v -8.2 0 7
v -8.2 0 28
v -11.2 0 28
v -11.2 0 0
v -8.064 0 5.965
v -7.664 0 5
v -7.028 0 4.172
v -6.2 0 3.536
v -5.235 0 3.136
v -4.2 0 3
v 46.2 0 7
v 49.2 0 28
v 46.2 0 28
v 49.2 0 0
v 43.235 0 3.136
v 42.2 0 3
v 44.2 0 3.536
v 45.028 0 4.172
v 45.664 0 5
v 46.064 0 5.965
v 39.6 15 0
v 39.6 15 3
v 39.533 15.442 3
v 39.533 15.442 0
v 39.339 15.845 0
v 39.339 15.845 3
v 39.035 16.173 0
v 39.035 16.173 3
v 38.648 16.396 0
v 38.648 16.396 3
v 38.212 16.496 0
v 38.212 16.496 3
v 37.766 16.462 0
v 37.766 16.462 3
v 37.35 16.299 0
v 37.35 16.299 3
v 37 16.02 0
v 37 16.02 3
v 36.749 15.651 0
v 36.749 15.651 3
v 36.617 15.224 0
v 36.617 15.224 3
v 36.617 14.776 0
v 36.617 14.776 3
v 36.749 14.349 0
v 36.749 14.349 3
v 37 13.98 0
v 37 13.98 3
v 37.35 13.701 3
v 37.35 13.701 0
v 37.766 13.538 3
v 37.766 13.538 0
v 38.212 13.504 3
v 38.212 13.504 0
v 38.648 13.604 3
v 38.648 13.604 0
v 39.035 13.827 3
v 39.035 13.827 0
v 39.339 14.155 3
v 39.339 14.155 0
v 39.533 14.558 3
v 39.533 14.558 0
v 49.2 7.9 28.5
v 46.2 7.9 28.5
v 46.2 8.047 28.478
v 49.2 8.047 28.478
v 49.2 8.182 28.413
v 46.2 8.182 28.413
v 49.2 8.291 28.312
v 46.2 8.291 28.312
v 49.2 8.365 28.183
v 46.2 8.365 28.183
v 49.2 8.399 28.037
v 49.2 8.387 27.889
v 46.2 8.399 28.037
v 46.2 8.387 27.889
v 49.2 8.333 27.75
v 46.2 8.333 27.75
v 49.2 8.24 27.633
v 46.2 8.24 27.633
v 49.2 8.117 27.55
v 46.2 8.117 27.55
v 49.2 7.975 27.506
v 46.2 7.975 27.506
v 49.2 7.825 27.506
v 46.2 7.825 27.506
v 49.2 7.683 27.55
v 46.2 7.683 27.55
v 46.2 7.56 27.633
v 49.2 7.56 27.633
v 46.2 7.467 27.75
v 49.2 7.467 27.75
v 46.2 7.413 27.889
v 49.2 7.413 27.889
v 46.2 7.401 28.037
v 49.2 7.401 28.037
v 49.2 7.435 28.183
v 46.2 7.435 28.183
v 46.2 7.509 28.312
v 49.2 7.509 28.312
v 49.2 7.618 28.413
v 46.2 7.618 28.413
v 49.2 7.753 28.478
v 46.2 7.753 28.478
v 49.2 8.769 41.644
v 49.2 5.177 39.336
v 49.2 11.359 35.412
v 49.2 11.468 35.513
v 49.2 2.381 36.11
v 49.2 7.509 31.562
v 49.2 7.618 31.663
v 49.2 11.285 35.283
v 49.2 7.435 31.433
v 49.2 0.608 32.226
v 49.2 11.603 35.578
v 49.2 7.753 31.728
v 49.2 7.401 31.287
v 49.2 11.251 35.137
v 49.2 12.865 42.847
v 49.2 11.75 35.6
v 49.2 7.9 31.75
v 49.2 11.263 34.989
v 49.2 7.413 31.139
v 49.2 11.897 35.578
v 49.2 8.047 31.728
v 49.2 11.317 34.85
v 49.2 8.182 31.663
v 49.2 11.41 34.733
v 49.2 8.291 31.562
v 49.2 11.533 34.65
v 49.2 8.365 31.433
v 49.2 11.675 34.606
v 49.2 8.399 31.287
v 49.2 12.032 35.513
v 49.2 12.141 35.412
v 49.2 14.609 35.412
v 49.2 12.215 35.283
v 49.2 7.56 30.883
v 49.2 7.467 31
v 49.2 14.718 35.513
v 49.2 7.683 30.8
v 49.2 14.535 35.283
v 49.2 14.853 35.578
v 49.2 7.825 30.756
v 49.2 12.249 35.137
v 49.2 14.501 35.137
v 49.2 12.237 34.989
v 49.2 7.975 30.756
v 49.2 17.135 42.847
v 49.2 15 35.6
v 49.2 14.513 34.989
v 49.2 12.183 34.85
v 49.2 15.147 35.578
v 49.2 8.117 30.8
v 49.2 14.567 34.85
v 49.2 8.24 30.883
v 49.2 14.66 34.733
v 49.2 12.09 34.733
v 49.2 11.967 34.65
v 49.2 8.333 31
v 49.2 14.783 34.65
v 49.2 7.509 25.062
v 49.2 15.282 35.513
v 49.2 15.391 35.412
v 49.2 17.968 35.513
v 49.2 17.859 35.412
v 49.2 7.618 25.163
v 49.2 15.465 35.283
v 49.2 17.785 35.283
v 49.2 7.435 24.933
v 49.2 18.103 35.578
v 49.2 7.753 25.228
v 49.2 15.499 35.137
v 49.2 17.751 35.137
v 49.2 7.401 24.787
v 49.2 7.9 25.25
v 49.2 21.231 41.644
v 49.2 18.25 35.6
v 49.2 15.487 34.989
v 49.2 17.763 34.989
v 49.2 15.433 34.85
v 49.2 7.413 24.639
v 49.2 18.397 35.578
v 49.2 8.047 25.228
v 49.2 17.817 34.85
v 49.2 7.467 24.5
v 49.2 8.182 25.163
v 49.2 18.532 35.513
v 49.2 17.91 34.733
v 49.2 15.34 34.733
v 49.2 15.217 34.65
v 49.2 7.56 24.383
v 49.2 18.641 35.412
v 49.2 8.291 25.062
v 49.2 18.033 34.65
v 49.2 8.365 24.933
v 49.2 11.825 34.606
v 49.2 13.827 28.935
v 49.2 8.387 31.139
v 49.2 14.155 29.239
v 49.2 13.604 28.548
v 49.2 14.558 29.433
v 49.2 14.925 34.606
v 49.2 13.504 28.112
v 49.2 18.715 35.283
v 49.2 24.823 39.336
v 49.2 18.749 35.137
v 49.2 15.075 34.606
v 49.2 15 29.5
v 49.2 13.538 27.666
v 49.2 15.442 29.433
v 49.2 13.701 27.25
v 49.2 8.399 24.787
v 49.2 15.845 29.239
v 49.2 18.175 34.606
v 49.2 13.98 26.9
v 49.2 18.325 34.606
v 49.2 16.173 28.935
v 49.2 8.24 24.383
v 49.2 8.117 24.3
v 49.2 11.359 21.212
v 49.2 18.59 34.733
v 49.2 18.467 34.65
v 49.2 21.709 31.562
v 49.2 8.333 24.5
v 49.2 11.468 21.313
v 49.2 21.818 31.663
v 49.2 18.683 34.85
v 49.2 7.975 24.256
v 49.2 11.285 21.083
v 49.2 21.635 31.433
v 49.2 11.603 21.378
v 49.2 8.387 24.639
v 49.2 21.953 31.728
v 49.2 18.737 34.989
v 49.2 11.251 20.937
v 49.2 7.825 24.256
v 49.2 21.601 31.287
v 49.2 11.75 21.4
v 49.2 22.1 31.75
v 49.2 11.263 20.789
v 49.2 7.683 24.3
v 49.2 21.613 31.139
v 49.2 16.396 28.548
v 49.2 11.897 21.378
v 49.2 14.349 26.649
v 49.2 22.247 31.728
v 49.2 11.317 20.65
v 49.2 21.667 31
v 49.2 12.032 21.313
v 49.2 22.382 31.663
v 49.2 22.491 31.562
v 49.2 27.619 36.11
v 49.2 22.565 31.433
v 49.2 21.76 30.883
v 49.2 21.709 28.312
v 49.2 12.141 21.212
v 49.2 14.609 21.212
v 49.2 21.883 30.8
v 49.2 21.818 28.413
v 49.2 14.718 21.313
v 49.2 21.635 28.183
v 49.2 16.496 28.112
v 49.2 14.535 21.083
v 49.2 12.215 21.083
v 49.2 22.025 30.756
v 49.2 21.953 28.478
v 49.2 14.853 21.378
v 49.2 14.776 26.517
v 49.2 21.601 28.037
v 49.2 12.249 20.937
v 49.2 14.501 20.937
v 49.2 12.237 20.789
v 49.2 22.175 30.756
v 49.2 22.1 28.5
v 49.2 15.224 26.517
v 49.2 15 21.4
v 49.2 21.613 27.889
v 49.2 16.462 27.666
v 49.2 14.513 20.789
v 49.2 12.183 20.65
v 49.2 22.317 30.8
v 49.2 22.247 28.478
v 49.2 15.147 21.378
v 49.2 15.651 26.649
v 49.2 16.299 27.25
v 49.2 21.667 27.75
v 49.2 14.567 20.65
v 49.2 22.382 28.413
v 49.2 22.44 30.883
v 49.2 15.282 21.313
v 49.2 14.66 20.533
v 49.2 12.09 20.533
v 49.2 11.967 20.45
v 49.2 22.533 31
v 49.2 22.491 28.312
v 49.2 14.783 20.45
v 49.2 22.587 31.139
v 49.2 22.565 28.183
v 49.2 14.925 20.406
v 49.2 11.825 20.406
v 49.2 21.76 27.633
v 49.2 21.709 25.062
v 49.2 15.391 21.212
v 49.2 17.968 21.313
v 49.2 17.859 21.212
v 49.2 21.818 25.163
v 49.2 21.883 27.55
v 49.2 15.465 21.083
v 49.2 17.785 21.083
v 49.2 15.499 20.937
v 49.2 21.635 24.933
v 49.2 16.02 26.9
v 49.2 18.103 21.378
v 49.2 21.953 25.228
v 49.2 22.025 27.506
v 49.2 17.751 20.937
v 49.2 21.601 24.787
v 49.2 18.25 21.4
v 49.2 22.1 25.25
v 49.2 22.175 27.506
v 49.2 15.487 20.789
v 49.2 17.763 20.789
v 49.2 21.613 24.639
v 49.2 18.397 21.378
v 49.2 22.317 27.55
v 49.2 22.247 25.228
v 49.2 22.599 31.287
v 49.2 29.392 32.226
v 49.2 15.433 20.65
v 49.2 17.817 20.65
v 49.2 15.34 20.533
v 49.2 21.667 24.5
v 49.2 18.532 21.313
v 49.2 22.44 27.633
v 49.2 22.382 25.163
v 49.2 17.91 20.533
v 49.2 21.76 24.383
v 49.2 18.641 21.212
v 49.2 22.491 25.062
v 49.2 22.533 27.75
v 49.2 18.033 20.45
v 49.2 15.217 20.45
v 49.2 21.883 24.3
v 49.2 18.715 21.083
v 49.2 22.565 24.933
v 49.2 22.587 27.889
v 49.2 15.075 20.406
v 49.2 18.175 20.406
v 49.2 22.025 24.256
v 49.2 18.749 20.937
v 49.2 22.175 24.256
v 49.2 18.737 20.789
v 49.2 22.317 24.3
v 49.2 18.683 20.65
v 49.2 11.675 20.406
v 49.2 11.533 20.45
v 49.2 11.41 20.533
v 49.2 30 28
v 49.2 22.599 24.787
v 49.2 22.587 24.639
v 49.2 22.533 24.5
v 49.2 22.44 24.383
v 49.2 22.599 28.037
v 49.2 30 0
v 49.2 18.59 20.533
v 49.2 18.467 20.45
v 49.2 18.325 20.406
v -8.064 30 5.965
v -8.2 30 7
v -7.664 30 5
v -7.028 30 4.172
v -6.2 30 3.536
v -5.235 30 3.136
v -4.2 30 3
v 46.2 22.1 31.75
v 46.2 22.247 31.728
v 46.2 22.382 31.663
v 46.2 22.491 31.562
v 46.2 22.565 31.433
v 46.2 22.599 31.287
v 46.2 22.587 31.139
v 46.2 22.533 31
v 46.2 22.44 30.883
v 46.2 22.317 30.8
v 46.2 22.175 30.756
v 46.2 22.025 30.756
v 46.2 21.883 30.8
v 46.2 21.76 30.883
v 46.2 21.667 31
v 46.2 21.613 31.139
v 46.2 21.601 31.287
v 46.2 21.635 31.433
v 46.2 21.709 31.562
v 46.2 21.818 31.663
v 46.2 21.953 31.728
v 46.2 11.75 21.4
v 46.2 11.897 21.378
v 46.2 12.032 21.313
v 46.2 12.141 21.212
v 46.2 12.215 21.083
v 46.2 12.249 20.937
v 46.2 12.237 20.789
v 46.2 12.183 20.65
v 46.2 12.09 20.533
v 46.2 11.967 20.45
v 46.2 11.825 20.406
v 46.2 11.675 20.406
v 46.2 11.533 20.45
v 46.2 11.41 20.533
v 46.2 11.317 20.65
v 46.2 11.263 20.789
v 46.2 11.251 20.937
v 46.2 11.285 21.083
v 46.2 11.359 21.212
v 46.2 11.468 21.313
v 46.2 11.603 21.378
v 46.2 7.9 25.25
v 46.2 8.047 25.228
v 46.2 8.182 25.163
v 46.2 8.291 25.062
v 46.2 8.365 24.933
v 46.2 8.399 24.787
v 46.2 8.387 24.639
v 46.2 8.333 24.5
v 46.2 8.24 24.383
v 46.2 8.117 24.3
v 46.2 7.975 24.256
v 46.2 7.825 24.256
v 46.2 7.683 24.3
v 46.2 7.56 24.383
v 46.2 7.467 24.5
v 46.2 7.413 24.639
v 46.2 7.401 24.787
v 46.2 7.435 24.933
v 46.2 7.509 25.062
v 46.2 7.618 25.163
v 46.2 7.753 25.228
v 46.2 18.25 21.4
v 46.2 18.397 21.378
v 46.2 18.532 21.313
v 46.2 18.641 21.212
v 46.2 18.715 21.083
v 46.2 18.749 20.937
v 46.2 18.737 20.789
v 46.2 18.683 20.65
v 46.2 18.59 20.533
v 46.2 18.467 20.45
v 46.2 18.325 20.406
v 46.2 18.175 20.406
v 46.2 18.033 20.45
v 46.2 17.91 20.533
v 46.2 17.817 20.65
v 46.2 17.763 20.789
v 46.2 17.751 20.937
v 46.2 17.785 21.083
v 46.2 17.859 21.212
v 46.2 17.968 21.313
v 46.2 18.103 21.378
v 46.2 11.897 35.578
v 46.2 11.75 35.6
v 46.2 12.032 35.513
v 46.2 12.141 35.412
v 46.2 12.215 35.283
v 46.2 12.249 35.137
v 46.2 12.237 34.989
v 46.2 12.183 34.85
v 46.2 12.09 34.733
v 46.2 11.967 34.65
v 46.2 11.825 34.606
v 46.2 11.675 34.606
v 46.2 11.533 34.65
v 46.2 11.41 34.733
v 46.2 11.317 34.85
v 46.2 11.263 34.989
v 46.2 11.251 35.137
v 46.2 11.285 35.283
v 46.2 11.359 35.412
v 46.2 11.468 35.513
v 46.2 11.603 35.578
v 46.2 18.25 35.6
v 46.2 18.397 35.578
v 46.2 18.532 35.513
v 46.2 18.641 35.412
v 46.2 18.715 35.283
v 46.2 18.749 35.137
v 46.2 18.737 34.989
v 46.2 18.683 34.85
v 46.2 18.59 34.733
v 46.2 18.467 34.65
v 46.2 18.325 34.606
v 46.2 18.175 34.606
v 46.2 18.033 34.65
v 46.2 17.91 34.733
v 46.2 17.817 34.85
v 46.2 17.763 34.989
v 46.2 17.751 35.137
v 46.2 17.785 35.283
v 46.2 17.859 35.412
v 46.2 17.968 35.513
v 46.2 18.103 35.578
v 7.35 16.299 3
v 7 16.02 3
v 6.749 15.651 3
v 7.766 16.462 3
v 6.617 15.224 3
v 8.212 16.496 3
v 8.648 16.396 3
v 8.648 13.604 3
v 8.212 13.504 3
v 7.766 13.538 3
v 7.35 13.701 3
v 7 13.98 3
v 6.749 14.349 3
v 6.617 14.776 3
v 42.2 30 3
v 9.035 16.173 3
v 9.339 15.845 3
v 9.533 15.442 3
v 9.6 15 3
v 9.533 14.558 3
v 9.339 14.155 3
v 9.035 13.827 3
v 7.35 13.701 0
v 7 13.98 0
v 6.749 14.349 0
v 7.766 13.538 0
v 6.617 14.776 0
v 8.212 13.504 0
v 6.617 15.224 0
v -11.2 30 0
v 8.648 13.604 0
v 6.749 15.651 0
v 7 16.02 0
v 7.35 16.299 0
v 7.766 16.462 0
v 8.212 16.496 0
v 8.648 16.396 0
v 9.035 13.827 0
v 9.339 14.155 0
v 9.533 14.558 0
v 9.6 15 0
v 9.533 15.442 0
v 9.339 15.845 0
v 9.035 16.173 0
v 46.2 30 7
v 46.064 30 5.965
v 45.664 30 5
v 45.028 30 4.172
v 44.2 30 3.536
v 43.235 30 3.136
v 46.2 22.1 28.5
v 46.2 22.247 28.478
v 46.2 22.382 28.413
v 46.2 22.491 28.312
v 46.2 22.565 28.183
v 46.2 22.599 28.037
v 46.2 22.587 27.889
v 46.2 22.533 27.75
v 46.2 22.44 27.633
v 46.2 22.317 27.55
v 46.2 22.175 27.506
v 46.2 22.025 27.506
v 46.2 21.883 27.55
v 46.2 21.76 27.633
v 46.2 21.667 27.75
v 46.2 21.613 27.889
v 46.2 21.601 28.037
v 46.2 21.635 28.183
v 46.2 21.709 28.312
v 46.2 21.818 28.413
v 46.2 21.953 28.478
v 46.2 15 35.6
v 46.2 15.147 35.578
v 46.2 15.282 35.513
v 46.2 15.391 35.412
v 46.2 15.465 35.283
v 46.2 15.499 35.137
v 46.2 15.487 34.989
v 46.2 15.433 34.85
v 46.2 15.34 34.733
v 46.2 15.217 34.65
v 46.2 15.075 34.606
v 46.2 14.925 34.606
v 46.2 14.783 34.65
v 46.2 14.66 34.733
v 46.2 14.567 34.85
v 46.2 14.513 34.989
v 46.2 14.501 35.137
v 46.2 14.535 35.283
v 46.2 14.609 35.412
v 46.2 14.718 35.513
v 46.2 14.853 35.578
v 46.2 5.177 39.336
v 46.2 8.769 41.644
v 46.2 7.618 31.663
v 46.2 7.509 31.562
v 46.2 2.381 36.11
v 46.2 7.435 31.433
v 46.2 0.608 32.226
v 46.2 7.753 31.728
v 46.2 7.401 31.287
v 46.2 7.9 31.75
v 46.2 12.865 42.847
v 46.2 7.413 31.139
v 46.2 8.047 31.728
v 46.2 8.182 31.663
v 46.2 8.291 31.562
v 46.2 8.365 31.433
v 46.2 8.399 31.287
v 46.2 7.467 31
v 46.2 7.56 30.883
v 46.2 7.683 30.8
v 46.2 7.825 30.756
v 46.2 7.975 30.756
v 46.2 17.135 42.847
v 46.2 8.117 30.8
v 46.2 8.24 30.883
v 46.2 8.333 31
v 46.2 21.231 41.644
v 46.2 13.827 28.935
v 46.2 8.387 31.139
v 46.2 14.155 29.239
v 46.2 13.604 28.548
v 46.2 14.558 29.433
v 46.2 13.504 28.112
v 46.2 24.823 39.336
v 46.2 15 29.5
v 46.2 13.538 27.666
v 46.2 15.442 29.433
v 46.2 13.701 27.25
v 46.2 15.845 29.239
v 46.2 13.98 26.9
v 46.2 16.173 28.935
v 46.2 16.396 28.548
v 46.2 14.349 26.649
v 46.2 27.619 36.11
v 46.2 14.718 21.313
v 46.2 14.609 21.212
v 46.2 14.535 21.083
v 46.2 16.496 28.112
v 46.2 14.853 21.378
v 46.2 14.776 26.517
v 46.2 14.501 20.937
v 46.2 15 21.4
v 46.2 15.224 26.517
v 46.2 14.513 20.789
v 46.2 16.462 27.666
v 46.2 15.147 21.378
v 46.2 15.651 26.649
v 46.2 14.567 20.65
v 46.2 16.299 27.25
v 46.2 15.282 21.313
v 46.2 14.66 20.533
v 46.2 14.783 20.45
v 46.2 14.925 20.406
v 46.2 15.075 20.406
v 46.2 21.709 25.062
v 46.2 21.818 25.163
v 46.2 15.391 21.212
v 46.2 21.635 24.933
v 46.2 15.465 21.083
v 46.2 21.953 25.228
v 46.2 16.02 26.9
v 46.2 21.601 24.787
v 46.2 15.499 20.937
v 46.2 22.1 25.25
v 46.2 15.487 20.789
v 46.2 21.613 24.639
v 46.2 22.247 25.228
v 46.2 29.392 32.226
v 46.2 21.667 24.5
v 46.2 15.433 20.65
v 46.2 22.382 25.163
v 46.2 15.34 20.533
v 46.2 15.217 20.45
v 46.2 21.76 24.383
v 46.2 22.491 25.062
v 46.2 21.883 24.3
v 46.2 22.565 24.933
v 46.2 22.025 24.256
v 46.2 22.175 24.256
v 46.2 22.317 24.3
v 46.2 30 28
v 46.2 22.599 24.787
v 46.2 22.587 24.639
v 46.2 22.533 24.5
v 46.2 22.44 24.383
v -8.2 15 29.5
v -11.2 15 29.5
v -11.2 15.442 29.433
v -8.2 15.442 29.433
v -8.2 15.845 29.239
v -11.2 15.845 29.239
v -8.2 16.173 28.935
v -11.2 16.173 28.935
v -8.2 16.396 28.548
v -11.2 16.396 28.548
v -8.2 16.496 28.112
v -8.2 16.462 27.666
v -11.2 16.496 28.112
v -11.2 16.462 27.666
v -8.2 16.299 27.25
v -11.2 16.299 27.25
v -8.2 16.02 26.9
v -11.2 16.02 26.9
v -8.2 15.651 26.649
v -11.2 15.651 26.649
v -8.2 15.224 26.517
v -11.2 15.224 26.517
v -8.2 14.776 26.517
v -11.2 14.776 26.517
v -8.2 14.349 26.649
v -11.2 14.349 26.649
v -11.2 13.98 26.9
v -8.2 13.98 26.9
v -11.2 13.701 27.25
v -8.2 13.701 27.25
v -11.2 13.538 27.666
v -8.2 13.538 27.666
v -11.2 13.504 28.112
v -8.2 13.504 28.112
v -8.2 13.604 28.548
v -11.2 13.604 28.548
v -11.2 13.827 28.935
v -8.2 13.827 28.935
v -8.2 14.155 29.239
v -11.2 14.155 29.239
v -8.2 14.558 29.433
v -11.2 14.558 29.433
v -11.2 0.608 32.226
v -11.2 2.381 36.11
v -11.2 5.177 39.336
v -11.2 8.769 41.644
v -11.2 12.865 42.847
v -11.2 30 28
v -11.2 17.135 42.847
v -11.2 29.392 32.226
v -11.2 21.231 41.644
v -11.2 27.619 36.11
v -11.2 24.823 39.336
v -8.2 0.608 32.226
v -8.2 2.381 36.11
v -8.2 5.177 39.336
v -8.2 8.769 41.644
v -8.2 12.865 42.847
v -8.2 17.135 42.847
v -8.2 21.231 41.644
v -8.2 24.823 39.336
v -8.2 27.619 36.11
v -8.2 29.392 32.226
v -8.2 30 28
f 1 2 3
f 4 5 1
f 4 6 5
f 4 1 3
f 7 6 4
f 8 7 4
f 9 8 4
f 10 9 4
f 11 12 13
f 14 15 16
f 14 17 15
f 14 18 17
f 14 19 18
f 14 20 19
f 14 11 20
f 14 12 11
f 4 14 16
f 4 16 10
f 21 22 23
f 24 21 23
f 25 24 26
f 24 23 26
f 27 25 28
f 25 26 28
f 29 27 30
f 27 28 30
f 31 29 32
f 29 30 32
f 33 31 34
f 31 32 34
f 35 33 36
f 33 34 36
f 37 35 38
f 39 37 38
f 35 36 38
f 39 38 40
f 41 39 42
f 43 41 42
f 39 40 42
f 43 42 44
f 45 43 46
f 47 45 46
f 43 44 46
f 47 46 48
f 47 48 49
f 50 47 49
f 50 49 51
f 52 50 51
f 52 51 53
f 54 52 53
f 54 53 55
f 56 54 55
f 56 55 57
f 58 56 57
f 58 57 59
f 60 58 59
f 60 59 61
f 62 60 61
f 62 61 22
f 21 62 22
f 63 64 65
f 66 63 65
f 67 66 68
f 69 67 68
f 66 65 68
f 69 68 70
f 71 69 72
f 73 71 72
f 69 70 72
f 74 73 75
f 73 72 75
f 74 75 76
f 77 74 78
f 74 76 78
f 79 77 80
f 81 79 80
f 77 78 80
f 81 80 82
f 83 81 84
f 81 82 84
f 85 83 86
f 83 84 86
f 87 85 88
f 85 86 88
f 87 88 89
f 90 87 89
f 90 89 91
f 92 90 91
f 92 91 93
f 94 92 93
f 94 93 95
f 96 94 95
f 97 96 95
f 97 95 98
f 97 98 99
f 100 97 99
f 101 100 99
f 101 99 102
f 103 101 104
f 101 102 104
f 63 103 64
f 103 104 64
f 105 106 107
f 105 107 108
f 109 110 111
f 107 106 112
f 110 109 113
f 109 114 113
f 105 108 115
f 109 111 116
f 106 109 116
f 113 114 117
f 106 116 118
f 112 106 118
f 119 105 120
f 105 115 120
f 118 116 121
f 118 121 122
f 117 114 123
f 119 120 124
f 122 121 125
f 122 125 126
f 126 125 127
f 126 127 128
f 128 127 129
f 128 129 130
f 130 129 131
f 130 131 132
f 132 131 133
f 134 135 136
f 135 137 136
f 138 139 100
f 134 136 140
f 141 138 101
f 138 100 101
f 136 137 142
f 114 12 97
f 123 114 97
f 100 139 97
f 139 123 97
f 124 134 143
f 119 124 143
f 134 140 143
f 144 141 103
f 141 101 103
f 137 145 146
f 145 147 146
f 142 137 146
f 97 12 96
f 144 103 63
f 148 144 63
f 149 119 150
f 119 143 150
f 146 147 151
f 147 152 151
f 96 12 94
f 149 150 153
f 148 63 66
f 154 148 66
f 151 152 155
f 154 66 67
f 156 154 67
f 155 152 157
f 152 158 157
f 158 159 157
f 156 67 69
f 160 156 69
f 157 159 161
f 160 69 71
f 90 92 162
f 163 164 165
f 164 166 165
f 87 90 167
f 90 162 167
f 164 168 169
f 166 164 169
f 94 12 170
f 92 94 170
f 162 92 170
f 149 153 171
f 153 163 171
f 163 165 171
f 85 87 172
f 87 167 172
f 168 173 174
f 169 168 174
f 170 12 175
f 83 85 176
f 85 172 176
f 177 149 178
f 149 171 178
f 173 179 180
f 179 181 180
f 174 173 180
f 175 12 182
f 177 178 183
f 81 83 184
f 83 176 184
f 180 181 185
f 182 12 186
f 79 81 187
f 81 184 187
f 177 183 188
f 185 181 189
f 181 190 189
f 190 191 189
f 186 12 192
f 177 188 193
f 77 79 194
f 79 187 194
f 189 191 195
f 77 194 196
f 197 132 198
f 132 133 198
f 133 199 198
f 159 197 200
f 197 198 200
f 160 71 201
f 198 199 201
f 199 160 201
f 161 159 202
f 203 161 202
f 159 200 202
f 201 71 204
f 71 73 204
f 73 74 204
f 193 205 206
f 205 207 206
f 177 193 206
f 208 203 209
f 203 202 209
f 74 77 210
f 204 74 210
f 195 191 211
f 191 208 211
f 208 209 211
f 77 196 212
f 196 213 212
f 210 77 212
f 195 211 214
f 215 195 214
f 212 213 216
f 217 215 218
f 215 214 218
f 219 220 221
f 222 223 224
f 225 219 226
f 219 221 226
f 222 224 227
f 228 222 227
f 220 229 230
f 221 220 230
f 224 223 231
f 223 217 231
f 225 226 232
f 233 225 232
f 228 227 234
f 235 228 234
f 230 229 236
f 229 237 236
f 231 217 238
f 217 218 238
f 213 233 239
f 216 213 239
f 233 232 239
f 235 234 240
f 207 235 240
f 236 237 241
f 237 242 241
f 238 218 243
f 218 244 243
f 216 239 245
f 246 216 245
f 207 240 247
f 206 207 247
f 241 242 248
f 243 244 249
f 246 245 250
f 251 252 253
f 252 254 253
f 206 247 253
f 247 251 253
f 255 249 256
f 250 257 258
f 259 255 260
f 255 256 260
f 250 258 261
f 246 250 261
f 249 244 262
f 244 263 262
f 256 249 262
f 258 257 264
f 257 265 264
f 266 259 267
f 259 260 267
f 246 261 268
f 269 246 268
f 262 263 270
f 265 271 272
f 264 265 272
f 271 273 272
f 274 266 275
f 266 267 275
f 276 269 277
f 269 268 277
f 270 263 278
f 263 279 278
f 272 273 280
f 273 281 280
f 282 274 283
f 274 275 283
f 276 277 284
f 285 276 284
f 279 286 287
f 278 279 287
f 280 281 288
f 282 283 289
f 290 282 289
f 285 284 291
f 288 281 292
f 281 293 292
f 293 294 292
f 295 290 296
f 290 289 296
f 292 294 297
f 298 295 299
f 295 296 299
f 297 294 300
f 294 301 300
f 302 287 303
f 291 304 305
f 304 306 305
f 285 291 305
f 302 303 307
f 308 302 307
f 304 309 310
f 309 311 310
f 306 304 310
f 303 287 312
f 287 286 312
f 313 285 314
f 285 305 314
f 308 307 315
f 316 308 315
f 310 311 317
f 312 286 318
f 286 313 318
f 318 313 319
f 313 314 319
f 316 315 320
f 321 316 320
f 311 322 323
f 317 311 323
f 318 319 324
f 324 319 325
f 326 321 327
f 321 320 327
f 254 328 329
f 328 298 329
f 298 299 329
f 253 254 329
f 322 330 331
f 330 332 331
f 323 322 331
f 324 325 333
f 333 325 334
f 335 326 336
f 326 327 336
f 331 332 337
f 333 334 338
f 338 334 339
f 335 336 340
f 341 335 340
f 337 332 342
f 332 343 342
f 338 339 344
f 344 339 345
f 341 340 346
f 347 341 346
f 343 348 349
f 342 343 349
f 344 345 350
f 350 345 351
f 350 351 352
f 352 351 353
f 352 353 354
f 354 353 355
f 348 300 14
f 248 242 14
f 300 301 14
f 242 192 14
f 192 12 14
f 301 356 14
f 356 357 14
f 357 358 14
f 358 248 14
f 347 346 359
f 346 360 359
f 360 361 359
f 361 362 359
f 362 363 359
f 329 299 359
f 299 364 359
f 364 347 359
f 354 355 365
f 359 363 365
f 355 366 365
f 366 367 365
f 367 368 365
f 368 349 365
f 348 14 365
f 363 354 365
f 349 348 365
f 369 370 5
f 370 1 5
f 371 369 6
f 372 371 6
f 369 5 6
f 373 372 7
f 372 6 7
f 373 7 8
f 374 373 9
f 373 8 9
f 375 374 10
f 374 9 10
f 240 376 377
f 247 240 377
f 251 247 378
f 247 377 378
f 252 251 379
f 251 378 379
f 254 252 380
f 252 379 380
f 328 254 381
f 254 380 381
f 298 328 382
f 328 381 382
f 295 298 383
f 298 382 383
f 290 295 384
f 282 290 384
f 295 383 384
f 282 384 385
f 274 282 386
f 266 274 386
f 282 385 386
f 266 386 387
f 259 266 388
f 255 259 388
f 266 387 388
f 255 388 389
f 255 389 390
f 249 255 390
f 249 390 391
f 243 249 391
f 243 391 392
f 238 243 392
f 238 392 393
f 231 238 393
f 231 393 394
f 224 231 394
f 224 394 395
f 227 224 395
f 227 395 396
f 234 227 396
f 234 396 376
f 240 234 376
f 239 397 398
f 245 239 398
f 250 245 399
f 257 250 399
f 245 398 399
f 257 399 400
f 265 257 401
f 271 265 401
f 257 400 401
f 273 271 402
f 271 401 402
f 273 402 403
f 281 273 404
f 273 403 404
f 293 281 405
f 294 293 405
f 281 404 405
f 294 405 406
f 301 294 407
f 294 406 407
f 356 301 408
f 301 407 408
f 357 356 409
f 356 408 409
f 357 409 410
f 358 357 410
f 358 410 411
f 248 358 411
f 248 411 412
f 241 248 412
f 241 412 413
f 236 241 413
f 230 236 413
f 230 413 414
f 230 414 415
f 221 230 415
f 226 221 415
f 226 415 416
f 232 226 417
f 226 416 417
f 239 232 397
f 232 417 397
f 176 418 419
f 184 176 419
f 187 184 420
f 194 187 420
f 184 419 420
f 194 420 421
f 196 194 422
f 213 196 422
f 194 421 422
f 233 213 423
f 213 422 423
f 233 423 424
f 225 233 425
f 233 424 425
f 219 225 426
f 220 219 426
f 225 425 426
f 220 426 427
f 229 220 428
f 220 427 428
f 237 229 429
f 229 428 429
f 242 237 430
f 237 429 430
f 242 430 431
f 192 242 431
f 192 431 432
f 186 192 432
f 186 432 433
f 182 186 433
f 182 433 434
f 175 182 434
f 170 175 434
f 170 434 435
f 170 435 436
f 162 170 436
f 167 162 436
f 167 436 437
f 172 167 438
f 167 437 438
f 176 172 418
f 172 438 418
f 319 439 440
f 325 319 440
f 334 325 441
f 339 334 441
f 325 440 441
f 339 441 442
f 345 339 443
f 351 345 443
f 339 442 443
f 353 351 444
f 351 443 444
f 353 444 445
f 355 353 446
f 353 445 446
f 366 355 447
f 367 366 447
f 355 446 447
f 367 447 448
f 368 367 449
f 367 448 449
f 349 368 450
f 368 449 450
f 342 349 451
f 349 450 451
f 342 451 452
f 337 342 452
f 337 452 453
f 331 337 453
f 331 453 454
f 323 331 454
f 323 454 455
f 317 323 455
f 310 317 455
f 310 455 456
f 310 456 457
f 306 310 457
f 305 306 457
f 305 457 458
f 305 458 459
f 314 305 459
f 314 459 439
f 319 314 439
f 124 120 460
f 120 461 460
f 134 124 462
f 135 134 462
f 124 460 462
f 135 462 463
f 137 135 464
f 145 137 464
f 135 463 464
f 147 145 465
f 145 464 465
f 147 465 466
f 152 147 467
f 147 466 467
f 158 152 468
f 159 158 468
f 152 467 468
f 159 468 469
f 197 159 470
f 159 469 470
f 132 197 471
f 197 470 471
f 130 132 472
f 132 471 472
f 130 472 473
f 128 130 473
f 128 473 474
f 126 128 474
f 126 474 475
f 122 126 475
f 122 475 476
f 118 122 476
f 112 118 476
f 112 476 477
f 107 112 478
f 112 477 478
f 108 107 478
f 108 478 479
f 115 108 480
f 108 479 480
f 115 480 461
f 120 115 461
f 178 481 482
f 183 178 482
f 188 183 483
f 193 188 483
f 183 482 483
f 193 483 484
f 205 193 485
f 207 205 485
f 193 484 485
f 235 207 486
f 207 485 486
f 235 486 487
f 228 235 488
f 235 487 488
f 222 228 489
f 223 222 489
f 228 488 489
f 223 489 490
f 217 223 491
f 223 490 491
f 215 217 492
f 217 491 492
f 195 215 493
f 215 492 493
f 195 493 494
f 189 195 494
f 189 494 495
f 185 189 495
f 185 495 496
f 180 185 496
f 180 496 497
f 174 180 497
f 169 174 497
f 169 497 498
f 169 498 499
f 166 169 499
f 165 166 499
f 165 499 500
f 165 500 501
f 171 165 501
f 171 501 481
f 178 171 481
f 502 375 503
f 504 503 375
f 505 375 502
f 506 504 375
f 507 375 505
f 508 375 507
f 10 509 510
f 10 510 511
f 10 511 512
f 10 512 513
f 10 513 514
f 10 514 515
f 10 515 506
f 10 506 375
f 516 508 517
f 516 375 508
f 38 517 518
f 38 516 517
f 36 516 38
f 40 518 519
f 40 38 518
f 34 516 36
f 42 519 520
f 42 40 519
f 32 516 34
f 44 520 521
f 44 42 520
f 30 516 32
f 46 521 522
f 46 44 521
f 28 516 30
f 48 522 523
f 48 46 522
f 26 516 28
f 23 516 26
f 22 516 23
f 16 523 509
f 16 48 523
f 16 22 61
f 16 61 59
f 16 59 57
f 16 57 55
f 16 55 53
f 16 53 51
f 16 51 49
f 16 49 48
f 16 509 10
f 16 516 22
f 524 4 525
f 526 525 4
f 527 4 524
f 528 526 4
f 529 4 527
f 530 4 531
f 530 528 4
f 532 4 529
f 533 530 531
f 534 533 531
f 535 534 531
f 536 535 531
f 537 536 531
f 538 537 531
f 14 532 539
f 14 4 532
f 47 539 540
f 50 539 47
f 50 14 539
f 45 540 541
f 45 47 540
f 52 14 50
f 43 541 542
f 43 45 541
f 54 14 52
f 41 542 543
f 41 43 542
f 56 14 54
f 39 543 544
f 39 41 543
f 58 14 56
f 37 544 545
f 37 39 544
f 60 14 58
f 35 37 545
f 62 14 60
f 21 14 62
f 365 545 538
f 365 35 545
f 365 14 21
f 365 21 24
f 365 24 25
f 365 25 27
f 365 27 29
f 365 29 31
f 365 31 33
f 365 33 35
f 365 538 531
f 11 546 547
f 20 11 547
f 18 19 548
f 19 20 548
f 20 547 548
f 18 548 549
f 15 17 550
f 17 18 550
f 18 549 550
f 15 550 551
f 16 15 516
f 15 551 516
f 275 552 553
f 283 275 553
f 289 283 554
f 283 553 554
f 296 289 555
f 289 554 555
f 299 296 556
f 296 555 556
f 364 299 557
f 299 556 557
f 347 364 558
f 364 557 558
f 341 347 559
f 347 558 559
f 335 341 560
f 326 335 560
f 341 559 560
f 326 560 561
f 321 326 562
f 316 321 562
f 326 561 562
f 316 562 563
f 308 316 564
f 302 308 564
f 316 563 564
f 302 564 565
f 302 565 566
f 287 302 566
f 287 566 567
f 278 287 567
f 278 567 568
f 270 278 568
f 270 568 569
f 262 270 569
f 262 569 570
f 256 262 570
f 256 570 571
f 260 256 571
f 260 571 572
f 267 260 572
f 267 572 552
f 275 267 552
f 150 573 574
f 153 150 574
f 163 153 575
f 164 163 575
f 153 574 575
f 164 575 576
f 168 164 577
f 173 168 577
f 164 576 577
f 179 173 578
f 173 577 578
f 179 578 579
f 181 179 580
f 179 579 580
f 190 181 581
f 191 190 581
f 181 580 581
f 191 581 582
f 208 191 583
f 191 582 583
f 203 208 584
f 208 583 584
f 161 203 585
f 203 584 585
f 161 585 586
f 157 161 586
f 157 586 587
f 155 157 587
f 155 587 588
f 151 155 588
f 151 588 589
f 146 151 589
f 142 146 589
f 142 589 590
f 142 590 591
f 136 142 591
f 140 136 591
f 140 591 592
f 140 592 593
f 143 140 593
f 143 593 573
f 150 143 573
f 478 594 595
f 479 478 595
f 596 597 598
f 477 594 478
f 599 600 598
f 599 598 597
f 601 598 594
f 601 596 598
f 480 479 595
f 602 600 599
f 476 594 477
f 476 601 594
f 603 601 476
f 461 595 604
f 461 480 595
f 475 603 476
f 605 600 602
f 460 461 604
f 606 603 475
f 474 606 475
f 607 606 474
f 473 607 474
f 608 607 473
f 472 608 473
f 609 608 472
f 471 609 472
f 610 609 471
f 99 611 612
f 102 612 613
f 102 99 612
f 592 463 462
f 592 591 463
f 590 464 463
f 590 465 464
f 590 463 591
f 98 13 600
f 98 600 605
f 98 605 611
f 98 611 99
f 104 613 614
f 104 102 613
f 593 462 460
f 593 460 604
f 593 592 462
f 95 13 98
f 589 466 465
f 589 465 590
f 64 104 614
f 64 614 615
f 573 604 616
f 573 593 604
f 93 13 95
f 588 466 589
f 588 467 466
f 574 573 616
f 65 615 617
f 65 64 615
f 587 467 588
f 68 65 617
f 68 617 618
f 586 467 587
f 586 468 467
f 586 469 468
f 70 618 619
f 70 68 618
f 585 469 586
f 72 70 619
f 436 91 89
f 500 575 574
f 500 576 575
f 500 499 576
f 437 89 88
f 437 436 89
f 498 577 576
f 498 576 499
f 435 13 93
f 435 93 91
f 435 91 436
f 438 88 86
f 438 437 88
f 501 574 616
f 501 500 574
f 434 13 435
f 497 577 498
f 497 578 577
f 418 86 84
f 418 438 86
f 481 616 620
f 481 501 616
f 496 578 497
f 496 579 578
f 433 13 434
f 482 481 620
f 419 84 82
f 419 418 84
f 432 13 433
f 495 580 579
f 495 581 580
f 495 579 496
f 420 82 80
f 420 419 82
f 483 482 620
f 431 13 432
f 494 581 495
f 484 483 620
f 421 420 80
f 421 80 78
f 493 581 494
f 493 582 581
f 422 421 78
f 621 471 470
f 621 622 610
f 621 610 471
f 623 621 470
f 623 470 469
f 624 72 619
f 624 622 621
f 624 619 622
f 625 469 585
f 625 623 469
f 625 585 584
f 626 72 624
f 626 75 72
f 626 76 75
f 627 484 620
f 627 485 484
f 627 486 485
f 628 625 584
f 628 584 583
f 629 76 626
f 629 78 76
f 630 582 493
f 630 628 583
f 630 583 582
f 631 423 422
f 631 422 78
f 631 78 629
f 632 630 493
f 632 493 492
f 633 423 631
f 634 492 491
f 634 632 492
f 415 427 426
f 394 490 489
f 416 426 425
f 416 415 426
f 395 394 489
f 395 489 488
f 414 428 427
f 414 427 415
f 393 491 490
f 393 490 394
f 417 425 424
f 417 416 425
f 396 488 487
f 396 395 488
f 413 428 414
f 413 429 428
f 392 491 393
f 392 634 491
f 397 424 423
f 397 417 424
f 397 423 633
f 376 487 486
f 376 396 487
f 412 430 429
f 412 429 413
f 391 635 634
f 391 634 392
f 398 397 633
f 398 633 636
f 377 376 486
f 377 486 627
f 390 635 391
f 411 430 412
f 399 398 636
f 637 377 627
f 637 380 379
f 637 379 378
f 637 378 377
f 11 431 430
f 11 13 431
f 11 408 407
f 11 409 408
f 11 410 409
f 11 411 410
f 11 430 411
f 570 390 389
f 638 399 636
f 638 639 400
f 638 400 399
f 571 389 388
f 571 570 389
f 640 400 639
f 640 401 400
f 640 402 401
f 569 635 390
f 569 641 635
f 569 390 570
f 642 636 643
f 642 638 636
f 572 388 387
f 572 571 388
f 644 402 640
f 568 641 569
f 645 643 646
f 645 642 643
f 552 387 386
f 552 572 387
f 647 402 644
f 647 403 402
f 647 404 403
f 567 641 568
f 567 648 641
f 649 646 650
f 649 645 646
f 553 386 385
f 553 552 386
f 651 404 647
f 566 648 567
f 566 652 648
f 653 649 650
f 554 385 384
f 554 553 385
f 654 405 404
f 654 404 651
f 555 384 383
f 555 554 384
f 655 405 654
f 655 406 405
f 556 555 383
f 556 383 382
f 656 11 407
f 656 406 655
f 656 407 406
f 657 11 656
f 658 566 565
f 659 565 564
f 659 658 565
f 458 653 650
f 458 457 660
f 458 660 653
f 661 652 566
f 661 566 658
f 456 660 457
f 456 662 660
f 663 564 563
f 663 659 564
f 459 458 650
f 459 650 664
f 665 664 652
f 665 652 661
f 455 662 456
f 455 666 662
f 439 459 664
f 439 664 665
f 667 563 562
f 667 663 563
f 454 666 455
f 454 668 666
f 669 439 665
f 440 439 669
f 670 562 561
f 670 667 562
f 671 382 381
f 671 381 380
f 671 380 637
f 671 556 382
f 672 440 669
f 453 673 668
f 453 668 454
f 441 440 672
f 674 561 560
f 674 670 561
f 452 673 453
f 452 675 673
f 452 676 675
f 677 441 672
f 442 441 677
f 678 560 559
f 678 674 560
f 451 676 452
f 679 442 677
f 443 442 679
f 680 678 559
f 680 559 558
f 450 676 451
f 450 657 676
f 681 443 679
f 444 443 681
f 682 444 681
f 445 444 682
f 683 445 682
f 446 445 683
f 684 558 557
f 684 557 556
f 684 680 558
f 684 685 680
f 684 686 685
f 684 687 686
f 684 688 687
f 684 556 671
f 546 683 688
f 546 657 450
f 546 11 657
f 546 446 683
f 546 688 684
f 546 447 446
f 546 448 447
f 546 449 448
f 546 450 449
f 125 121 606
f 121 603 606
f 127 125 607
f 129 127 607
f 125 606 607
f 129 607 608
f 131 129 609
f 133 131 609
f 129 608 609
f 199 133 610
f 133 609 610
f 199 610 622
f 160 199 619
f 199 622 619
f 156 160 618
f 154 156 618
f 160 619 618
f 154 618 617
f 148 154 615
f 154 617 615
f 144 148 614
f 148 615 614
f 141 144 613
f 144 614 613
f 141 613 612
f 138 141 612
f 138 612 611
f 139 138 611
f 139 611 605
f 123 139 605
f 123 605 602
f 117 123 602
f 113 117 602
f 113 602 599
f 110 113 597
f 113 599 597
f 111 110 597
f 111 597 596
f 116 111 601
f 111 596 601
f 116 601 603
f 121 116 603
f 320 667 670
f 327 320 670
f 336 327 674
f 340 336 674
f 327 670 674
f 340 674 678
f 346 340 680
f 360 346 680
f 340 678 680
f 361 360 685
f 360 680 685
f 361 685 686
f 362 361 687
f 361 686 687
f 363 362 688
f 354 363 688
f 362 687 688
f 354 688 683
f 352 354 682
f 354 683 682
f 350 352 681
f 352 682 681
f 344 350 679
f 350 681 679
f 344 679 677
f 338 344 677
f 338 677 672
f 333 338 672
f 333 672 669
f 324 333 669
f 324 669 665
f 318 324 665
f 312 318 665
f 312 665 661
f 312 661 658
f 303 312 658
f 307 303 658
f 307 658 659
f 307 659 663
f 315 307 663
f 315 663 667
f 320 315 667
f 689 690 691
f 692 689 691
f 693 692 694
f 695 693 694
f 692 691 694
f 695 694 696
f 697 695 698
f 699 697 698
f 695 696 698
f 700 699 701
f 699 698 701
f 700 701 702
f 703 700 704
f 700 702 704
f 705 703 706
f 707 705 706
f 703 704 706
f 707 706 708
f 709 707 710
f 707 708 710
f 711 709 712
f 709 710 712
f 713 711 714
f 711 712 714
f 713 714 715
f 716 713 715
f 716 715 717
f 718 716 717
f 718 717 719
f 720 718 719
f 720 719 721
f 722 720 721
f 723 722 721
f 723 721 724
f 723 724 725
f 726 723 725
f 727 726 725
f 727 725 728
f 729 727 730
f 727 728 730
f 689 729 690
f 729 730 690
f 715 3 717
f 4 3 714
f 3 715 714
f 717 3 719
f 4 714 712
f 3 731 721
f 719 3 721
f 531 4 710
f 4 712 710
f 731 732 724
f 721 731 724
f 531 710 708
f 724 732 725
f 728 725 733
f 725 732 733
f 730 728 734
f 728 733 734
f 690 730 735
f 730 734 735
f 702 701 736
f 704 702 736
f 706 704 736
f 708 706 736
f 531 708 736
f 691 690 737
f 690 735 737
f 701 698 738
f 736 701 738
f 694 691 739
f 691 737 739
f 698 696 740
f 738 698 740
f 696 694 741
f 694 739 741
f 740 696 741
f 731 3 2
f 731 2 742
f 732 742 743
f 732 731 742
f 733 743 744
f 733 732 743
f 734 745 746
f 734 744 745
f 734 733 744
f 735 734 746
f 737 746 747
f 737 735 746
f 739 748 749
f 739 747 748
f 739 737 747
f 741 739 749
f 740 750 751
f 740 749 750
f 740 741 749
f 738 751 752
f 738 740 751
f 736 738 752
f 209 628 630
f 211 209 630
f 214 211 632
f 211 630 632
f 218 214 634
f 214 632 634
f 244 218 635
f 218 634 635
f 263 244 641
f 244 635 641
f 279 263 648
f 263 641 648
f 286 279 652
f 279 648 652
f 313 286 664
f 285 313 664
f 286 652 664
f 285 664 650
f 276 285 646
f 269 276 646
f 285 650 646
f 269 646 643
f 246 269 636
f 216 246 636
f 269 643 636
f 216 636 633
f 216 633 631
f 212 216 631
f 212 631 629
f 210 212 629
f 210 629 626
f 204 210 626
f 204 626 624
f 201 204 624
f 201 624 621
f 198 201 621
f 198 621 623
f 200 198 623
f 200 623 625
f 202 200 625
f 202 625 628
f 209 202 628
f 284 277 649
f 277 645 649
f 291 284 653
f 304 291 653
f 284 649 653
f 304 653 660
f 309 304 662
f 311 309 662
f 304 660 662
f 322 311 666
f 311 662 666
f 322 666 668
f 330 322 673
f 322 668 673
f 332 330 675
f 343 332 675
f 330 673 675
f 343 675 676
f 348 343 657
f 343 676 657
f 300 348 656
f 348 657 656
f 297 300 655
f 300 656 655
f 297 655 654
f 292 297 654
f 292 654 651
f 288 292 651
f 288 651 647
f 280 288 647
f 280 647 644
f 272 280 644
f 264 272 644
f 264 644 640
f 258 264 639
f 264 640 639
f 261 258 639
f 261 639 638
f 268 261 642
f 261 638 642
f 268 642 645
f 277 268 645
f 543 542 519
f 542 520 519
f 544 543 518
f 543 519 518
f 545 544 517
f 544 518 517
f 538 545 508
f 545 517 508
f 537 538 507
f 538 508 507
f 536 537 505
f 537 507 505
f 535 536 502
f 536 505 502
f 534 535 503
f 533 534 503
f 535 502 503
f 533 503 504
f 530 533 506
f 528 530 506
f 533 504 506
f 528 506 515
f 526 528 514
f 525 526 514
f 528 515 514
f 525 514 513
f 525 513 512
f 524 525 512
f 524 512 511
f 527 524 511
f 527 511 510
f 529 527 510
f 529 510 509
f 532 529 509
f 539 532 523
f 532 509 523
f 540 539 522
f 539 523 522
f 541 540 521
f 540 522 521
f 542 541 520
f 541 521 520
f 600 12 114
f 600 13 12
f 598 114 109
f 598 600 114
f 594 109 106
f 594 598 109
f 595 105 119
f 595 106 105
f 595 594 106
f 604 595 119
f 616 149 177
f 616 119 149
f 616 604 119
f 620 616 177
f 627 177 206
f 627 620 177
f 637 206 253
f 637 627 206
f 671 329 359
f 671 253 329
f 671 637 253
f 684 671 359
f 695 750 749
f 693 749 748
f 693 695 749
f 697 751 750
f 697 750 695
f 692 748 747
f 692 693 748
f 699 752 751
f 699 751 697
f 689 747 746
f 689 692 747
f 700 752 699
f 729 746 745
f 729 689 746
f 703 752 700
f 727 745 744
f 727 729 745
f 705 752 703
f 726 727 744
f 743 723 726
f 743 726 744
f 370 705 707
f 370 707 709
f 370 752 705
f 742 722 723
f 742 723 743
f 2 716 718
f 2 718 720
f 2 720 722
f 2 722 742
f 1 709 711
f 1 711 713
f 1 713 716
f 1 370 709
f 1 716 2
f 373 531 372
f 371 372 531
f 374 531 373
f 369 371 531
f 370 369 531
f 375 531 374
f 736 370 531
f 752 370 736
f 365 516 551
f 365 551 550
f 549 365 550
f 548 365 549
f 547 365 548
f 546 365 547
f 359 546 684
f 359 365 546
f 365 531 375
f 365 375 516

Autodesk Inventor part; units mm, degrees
ref_plane "YZ Plane" through (0, 0, 0) normal (1, 0, 0) x (0, 1, 0)
ref_plane "XZ Plane" through (0, 0, 0) normal (0, 1, 0) x (-1, 0, 0)
ref_plane "XY Plane" through (0, 0, 0) normal (0, 0, 1) x (1, 0, 0)
sketch "Sketch1" plane through (0, 0, 0) normal (0, 0, 1) x (1, 0, 0)
  line L0 (0, 0) -> (46.2, 0)
  line L1 (46.2, 0) -> (46.2, 30)
  line L2 (46.2, 30) -> (0, 30)
  line L3 (0, 30) -> (0, 0)
  dimension "d0" = 46.2
  dimension "d1" = 30
extrude "Extrusion1" add sketch "Sketch1" along normal blind 3
sketch "Sketch2" plane through (0, 0, 3) normal (0, 0, 1) x (1, 0, 0)
  line L0 (0, 0) -> (46.2, 0) projected
  line L1 (0, 0) -> (0, 15)
  line L2 (0, 30) -> (0, 0) projected
  line L3 (0, 15) -> (23.1, 15)
  line L4 (46.2, 0) -> (46.2, 30) projected
  line L5 (23.1, 15) -> (38.1, 15)
  line L6 (23.1, 15) -> (8.1, 15)
  circle A0 centre (8.1, 15) radius 1.5
  circle A1 centre (38.1, 15) radius 1.5
  dimension "d4" = 15
  dimension "d5" = 23.1
  dimension "d6" = 15
  dimension "d7" = 15
  dimension "d8" = 3
  dimension "d9" = 3
extrude "Extrusion2" cut sketch "Sketch2" against normal blind 3
sketch "Sketch3" plane through (0, 0, 3) normal (0, 0, 1) x (1, 0, 0)
  circle A0 centre (38.1, 15) radius 1.5 projected
  circle A1 centre (8.1, 15) radius 1.5 projected
  line L0 (46.2, 0) -> (46.2, 30) projected
  line L1 (46.2, 30) -> (0, 30) projected
  line L2 (0, 30) -> (0, 0) projected
  line L3 (0, 0) -> (46.2, 0) projected
  circle A2 centre (38.1, 15) radius 3.5
  line L4 (38.1, 15) -> (41.6, 15)
  line L5 (41.6, 15) -> (42.6, 15)
  line L6 (42.6, 15) -> (45.6, 15)
  line L7 (45.6, 15) -> (45.6, 30)
  line L8 (45.6, 15) -> (45.6, 0)
  line L9 (0, 0) -> (46.2, 0) projected
  line L10 (45.6, 0) -> (46.2, 0)
  circle A3 centre (8.1, 15) radius 3.5
  line L11 (8.1, 15) -> (4.6, 15)
  line L12 (4.6, 15) -> (1.6, 15)
  line L13 (1.6, 15) -> (1.6, 30)
  line L14 (46.2, 30) -> (0, 30) projected
  line L15 (1.6, 30) -> (0, 30)
  line L16 (1.6, 15) -> (1.6, 0)
  dimension "d12" = 7
  dimension "d17" = 7
  dimension "d13" = 1
  dimension "d14" = 3
  dimension "d15" = 15
  dimension "d16" = 15
  dimension "d18" = 3
extrude "Extrusion6" cut sketch "Sketch3" against normal blind 40 contours L3 L2 L1 L13 L16
sketch "Sketch6" plane through (0, 0, 3) normal (0, 0, 1) x (1, 0, 0)
  line L0 (1.6, 30) -> (1.6, 0) projected
  line L1 (1.6, 0) -> (46.2, 0) projected
  line L2 (46.2, 0) -> (46.2, 30) projected
  line L3 (46.2, 30) -> (1.6, 30) projected
  circle A0 centre (8.1, 15) radius 1.5 projected
  circle A1 centre (38.1, 15) radius 1.5 projected
  line L4 (1.6, 0) -> (46.2, 0) projected
  line L5 (46.2, 0) -> (49.2, 0)
  line L6 (49.2, 0) -> (49.2, 30)
  line L7 (49.2, 30) -> (46.2, 30)
  point P0 (0, 0)
  dimension "d33" = 3
  dimension "d34" = 30
extrude "Extrusion7" add sketch "Sketch6" against normal blind 3 contours L7 L6 L5 L2
sketch "Sketch7" plane through (0, 0, 3) normal (0, 0, 1) x (1, 0, 0)
  line L0 (1.6, 30) -> (1.6, 0) projected
  line L1 (1.6, 0) -> (49.2, 0) projected
  line L2 (49.2, 0) -> (49.2, 30) projected
  line L3 (49.2, 30) -> (1.6, 30) projected
  circle A0 centre (8.1, 15) radius 1.5 projected
  circle A1 centre (38.1, 15) radius 1.5 projected
  line L4 (49.2, 30) -> (49.2, 0) projected
  line L5 (49.2, 0) -> (46.2, 0)
  line L6 (1.6, 0) -> (49.2, 0) projected
  line L7 (46.2, 0) -> (46.2, 30)
  line L8 (49.2, 30) -> (1.6, 30) projected
  line L9 (46.2, 30) -> (49.2, 30)
  point P0 (0, 0)
  dimension "d37" = 3
extrude "Extrusion8" add sketch "Sketch7" along normal blind 40 contours L3 L2 L1 L7
sketch "Sketch8" plane through (46.2, 0, 3) normal (-1, 0, 0) x (0, 0, 1)
  line L0 (0, 0) -> (0, 30) projected
  line L1 (0, 0) -> (40, 0) projected
  line L2 (40, 30) -> (40, 0) projected
  line L3 (0, 30) -> (40, 30) projected
  line L4 (0, 30) -> (0, 15)
  line L5 (0, 30) -> (0, 0) projected
  line L6 (0, 15) -> (25, 15)
  circle A0 centre (25, 15) radius 1.5
  circle A1 centre (25, 15) radius 15
  line L7 (-3, 30) -> (40, 30) projected
  line L8 (40, 0) -> (-3, 0) projected
  point P0 (25, 30)
  point P1 (25, 0)
  point P2 (40, 15)
  point P3 (25, 0)
  point P4 (25, 30)
  dimension "d40" = 15
  dimension "d41" = 25
  dimension "d42" = 3
extrude "Extrusion9" cut sketch "Sketch8" against normal blind 40 contours A1 L2 L1 | A1 L3 L2 | A0
fillet "Fillet1" radius 4 1 edges at (46.2, 15, 3)
sketch "Sketch9" plane through (46.2, 15, 28) normal (-1, 0, 0) x (0, 0, 1)
  line L0 (-21, -15) -> (-21, 15) projected
  line L1 (-21, -15) -> (0, -15) projected
  arc A0 (0, -15) -> (0, 15) centre (0, 0) ccw projected
  line L2 (-21, 15) -> (0, 15) projected
  circle A1 centre (0, 0) radius 1.5 projected
  line L3 (0, 0) -> (0, 7.1)
  line L4 (0, 7.1) -> (3.25, 7.1)
  line L5 (0, 7.1) -> (-3.25, 7.1)
  circle A2 centre (0, 7.1) radius 0.5
  circle A3 centre (3.25, 7.1) radius 0.5
  circle A4 centre (-3.25, 7.1) radius 0.5
  line L6 (0, 0) -> (4.7365, 0)
  line L7 (0, 0) -> (5.6569, 5.6569)
  line L8 (0, 0) -> (8, 0) construction
  circle A5 centre (0, -7.1) radius 0.5
  circle A6 centre (3.25, -7.1) radius 0.5
  circle A7 centre (-3.25, -7.1) radius 0.5
  circle A8 centre (7.1, 0) radius 0.5
  circle A9 centre (7.1, 3.25) radius 0.5
  circle A10 centre (7.1, -3.25) radius 0.5
  circle A11 centre (-7.1, -3.25) radius 0.5
  circle A12 centre (-7.1, 0) radius 0.5
  circle A13 centre (-7.1, 3.25) radius 0.5
  point P0 (-28, -15)
  dimension "d47" = 7.1
  dimension "d48" = 3.25
  dimension "d49" = 3.25
  dimension "d50" = 1
  dimension "d51" = 1
  dimension "d52" = 1
  dimension "d53" = 8
  dimension "d54" = 45
extrude "Extrusion10" cut sketch "Sketch9" against normal blind 40 contours A2 L5 L3 | L3 L4 A2 | L5 A2 L4 | A3 | A4 | A5 | A6 | A7 | A8 | A9 | A10 | A11 | A12 | A13
sketch "Sketch10" plane through (1.6, 0, 3) normal (-1, 0, 0) x (0, 0, 1)
  line L0 (-3, 0) -> (-3, 30) projected
  line L1 (0, 0) -> (-3, 0) projected
  line L2 (0, 30) -> (0, 0) projected
  line L3 (-3, 30) -> (0, 30) projected
  point P0 (-3, 0)
extrude "Extrusion11" add sketch "Sketch10" along normal blind 20
sketch "Sketch11" plane through (0, 0, 3) normal (0, 0, 1) x (1, 0, 0)
  line L0 (42.2, 30) -> (42.2, 0) projected
  line L1 (42.2, 30) -> (-18.4, 30) projected
  line L2 (-18.4, 0) -> (-18.4, 30) projected
  line L3 (-18.4, 0) -> (42.2, 0) projected
  circle A0 centre (8.1, 15) radius 1.5 projected
  circle A1 centre (38.1, 15) radius 1.5 projected
  line L4 (-18.4, 30) -> (49.2, 30) projected
  line L5 (-18.4, 30) -> (-8.2, 30)
  line L6 (-8.2, 30) -> (-8.2, 0)
  line L7 (-18.4, 0) -> (49.2, 0) projected
  line L8 (-8.2, 0) -> (-11.2, 0)
  line L9 (-11.2, 0) -> (-11.2, 30)
  point P0 (0, 0)
  point P1 (-8.2, 0)
  dimension "d59" = 10.2
  dimension "d60" = 3
extrude "Extrusion12" add sketch "Sketch11" along normal blind 40 contours L6 L3 L9 L1
sketch "Sketch12" plane through (-11.2, 0, 3) normal (-1, 0, 0) x (0, 0, 1)
  circle A0 centre (25, 15) radius 1.5 projected
  arc A1 (25, 0) -> (25, 30) centre (25, 15) ccw projected
  line L0 (0, 30) -> (40, 30) projected
  line L1 (25, 30) -> (40, 30)
  line L2 (40, 30) -> (40, 0) projected
  line L3 (40, 30) -> (40, 0)
  line L4 (40, 0) -> (25, 0)
  point P0 (-3, 0)
  point P1 (40, 15)
extrude "Extrusion13" cut sketch "Sketch12" against normal blind 4
sketch "Sketch13" plane through (0, 0, 3) normal (0, 0, 1) x (1, 0, 0)
  line L0 (-11.2, 0) -> (-11.2, 30) projected
  line L1 (-11.2, 30) -> (-18.4, 30) projected
  line L2 (-18.4, 0) -> (-18.4, 30) projected
  line L3 (-18.4, 0) -> (-11.2, 0) projected
  point P0 (0, 0)
extrude "Extrusion14" cut sketch "Sketch13" against normal blind 4
fillet "Fillet3" radius 4 1 edges at (-8.2, 15, 3)
properties part number "acople_1"
